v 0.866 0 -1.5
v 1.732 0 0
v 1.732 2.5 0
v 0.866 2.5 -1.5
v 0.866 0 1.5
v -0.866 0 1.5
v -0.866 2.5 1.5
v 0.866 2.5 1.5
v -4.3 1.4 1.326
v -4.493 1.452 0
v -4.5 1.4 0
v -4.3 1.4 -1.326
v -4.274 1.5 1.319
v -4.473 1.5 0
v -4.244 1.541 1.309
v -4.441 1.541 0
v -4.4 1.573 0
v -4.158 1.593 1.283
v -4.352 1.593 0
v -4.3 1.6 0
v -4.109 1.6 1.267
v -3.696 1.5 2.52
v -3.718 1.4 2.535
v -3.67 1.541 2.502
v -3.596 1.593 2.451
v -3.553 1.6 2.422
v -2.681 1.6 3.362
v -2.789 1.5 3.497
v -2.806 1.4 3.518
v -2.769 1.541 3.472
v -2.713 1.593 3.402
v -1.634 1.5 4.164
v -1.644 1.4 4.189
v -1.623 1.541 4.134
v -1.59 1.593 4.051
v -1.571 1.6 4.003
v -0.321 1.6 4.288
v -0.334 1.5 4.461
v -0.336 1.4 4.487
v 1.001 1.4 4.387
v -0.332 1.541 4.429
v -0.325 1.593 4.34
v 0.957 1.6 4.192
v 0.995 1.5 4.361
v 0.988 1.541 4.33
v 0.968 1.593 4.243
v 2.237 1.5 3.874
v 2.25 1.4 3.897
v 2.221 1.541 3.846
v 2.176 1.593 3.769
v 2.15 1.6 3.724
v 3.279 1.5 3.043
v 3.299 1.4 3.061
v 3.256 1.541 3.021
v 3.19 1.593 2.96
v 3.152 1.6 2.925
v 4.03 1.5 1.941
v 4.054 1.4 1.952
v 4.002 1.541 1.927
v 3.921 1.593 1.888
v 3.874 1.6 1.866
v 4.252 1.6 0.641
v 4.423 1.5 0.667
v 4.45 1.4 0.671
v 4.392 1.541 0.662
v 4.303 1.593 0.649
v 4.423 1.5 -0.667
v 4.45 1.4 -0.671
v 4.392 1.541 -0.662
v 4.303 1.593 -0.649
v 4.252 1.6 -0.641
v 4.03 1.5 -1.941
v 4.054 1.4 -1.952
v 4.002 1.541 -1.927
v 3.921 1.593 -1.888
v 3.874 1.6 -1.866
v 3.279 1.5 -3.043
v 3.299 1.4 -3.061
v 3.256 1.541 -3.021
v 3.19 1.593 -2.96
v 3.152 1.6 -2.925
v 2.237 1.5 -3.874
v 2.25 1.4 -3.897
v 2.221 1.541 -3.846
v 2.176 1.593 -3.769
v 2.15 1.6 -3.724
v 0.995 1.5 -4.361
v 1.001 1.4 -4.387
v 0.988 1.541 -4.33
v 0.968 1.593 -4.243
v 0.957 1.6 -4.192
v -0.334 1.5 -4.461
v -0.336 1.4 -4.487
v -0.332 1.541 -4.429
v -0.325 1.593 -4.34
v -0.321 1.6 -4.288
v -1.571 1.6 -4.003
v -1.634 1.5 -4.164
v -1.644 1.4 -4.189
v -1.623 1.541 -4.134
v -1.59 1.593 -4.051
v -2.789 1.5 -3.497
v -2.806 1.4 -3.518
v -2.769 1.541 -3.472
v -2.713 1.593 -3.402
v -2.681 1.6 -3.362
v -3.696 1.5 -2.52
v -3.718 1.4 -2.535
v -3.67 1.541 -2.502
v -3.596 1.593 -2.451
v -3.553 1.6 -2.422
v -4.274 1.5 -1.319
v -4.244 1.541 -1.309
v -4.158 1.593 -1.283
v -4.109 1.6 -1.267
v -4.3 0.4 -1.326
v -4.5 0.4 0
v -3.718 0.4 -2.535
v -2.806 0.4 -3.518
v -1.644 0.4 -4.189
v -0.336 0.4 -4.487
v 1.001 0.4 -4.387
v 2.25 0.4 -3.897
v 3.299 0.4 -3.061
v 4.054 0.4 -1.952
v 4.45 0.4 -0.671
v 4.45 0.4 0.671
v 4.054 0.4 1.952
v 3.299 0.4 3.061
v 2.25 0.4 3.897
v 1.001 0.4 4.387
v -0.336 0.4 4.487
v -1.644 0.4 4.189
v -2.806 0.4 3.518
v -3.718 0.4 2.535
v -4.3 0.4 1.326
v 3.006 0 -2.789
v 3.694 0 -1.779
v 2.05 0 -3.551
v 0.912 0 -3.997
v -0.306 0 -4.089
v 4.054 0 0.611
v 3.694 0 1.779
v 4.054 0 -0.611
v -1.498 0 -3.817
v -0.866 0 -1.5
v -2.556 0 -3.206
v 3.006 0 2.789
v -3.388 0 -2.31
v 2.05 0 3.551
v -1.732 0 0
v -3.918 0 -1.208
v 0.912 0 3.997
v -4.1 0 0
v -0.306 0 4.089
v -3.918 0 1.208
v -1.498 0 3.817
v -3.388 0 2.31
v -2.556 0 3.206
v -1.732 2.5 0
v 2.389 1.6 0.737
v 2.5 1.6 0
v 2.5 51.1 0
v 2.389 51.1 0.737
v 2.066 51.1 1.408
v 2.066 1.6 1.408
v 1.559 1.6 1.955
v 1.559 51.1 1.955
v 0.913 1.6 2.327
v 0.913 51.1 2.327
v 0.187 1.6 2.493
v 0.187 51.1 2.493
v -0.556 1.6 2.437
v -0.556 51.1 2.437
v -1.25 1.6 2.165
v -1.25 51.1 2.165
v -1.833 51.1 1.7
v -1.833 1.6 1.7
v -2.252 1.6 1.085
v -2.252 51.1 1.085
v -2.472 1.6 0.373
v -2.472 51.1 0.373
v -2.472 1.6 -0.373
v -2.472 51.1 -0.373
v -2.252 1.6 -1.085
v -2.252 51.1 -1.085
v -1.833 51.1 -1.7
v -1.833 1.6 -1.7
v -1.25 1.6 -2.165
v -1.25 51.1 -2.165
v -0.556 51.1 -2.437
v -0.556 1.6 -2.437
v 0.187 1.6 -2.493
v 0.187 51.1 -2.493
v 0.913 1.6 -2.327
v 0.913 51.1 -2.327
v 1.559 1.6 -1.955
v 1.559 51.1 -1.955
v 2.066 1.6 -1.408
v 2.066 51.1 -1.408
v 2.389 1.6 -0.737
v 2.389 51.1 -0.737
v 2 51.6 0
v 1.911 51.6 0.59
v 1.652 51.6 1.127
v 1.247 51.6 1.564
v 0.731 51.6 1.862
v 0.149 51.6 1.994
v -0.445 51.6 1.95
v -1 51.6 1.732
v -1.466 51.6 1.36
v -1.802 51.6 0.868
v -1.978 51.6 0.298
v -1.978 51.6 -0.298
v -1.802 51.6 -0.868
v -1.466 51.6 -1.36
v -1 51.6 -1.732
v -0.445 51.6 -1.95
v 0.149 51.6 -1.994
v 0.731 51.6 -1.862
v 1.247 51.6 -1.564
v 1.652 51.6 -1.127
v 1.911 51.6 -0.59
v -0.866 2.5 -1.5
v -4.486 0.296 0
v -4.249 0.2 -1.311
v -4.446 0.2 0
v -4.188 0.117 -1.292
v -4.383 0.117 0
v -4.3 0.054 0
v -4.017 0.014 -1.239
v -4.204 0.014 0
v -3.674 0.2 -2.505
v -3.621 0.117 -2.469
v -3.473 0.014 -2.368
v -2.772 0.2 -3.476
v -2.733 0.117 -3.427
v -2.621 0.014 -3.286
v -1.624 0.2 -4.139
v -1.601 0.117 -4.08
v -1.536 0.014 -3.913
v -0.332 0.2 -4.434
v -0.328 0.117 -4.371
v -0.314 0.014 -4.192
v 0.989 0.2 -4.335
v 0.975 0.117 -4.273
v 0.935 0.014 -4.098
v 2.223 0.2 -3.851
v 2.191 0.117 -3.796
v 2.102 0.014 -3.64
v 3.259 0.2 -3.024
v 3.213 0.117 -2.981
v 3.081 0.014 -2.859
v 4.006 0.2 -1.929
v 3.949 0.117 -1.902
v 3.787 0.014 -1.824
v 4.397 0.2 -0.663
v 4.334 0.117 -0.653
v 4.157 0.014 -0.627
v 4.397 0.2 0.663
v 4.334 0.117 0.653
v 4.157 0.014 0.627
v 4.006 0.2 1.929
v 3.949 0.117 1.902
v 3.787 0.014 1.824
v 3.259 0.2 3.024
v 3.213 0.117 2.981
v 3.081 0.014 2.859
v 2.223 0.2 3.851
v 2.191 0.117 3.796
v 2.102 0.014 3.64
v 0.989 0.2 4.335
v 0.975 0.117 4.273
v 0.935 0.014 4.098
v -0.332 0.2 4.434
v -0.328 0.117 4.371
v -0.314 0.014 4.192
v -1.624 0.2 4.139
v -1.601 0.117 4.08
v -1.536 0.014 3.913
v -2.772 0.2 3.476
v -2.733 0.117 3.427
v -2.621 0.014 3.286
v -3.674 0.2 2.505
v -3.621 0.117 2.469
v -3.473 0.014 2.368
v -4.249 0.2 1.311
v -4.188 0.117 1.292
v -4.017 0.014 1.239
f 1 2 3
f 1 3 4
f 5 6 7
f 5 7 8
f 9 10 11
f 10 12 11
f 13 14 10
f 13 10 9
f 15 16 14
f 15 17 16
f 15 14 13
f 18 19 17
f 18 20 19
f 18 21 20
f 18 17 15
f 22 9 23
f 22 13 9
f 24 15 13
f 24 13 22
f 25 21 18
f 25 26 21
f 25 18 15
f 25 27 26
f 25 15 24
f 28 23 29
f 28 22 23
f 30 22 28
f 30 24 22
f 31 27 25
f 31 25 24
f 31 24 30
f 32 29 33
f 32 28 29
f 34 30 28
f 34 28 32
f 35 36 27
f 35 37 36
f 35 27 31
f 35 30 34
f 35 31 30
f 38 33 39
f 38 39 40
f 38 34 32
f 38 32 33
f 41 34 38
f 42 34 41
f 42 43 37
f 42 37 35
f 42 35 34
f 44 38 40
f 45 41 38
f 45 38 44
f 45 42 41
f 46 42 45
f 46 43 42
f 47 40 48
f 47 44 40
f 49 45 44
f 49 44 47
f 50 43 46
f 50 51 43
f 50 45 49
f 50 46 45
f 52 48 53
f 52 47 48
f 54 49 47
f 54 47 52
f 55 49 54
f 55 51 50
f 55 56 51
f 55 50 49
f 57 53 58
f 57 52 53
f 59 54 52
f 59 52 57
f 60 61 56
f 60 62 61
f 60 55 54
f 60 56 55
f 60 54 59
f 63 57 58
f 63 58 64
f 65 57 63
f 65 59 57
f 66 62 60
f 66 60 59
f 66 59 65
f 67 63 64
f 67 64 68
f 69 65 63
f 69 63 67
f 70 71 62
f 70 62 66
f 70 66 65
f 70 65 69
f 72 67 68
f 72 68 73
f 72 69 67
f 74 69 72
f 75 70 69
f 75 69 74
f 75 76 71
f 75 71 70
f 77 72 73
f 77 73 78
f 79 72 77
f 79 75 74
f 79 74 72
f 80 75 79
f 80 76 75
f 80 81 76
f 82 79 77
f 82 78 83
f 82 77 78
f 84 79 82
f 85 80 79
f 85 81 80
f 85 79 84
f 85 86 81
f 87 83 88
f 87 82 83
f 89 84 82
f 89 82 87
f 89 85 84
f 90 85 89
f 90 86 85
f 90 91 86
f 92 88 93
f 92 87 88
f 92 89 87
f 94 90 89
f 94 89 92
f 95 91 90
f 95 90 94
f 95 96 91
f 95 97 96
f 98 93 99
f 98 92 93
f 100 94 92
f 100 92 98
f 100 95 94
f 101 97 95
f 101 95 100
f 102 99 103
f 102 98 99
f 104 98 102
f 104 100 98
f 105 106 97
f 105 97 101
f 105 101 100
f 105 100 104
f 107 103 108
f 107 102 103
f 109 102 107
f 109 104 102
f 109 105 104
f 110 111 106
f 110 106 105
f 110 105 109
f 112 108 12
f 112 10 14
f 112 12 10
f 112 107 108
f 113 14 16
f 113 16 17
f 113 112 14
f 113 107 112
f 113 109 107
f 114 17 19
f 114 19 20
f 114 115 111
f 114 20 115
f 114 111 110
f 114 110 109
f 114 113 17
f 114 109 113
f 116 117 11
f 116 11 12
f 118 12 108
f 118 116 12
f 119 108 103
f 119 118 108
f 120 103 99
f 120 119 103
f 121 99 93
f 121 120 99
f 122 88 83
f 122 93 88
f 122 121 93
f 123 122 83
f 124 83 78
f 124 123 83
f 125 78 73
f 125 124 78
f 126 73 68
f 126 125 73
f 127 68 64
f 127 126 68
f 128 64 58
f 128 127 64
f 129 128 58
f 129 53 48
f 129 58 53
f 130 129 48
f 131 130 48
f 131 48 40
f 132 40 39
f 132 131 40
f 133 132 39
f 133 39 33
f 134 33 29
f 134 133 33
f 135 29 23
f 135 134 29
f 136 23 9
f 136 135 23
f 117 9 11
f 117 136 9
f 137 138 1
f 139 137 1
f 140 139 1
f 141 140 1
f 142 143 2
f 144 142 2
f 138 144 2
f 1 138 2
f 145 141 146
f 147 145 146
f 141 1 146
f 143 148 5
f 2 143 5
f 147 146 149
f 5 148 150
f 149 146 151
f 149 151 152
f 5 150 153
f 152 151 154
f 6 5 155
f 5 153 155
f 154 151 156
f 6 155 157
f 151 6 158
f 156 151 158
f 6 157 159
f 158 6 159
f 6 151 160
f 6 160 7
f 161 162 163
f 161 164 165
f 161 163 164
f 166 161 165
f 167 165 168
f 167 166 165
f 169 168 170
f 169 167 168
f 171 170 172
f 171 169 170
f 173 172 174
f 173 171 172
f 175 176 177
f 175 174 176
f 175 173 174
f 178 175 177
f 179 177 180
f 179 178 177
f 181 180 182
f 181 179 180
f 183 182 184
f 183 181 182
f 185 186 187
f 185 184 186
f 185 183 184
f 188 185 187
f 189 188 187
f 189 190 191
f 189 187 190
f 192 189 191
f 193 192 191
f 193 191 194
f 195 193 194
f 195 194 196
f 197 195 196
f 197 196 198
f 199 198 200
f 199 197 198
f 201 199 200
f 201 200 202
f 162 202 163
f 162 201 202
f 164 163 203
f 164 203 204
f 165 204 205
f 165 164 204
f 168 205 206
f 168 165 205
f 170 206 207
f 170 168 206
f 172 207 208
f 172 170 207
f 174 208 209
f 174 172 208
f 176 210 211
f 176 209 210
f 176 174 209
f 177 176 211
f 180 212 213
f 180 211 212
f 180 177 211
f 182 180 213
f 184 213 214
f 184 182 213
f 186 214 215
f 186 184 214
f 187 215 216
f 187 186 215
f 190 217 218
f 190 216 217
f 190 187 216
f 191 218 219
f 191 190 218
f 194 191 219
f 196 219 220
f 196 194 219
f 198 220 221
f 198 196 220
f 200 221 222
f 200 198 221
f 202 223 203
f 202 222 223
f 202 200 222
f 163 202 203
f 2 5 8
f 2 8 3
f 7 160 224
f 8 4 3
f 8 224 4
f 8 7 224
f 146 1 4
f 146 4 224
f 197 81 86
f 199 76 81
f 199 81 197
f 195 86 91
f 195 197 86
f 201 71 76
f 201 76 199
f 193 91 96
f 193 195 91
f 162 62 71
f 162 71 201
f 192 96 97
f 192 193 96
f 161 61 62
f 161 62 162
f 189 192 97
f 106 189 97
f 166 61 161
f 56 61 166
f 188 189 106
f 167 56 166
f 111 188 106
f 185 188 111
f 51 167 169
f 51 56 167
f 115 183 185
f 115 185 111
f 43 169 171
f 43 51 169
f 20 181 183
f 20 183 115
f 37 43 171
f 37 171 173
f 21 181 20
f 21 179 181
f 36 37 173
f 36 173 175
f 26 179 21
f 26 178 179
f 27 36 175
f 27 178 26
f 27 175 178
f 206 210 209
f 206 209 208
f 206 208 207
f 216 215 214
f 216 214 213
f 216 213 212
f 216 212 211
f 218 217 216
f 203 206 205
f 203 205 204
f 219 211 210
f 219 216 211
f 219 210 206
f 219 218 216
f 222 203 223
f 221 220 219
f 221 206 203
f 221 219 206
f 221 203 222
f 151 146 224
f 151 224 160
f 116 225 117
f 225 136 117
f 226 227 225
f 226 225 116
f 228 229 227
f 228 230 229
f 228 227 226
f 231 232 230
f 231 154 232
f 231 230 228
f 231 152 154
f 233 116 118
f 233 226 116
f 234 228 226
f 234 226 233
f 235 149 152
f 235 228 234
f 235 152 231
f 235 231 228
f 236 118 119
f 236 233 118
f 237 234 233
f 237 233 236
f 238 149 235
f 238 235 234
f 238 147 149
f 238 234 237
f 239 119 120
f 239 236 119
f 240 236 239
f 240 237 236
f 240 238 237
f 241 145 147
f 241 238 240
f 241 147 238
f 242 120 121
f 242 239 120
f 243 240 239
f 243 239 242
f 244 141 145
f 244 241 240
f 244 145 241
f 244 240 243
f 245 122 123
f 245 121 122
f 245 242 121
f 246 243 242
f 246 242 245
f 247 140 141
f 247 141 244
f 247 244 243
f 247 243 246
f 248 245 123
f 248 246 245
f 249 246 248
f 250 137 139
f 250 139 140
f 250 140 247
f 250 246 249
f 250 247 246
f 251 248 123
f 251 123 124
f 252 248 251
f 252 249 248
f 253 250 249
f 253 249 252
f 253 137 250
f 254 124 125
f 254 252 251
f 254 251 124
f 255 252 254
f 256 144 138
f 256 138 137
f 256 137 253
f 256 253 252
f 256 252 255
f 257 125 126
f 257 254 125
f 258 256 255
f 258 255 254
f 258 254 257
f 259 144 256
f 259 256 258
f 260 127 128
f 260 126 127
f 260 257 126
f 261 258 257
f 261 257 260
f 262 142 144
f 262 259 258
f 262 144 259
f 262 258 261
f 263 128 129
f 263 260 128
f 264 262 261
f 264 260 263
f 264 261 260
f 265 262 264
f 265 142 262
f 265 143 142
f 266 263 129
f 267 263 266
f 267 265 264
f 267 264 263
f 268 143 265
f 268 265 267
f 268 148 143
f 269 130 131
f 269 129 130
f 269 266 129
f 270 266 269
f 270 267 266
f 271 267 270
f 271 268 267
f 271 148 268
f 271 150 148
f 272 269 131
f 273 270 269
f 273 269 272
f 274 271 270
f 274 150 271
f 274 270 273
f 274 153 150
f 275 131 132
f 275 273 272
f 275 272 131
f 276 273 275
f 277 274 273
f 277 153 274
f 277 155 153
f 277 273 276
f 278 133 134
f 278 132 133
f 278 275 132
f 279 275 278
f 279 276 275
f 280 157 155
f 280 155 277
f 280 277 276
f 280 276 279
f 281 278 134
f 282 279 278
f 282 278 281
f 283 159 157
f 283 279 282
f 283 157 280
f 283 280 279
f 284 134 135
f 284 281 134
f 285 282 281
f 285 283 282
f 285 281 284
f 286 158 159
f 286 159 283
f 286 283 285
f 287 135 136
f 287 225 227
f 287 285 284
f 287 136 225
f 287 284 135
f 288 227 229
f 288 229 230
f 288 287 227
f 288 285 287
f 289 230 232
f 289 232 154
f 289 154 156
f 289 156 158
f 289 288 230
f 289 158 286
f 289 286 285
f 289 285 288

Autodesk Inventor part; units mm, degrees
ref_plane "YZ Plane" through (0, 0, 0) normal (1, 0, 0) x (0, 1, 0)
ref_plane "XZ Plane" through (0, 0, 0) normal (0, 1, 0) x (-1, 0, 0)
ref_plane "XY Plane" through (0, 0, 0) normal (0, 0, 1) x (1, 0, 0)
sketch "Boceto1" plane through (0, 0, 0) normal (0, 1, 0) x (-1, 0, 0)
  circle A0 centre (0, 0) radius 4.5
  dimension "d0" = 9
extrude "Extrusión1" add sketch "Boceto1" along normal blind 1.6
sketch "Boceto2" plane through (0, 1.6, 0) normal (0, 1, 0) x (1, 0, 0)
  circle A0 centre (0, 0) radius 2.5
  dimension "d3" = 5
extrude "Extrusión2" add sketch "Boceto2" along normal blind 50
fillet "Empalme1" radius 0.4 1 edges at (4.5, 0, 0)
fillet "Empalme2" radius 0.2 1 edges at (4.5, 1.6, 0)
sketch "Boceto3" plane through (0, 0, 0) normal (0, -1, 0) x (1, 0, 0)
  line L0 (-1.7321, 0) -> (-0.866, 1.5)
  line L1 (-0.866, 1.5) -> (0.866, 1.5)
  line L2 (0.866, 1.5) -> (1.7321, 0)
  line L3 (1.7321, 0) -> (0.866, -1.5)
  line L4 (0.866, -1.5) -> (-0.866, -1.5)
  line L5 (-0.866, -1.5) -> (-1.7321, 0)
  point P0 (0, 0)
  point P1 (0, 0)
  dimension "d8" = 3
extrude "Extrusión3" cut sketch "Boceto3" against normal blind 2.5
chamfer "Chaflán1" distance 0.5 angle 45 1 edges at (-2.5, 51.6, 0)
thread "Rosca2" size "M5x0.8" class "6g" standard "ANSI Metric M Profile" length 20
properties part number "Perno M5x8 cabeza plana" material "Hierro, gris"
